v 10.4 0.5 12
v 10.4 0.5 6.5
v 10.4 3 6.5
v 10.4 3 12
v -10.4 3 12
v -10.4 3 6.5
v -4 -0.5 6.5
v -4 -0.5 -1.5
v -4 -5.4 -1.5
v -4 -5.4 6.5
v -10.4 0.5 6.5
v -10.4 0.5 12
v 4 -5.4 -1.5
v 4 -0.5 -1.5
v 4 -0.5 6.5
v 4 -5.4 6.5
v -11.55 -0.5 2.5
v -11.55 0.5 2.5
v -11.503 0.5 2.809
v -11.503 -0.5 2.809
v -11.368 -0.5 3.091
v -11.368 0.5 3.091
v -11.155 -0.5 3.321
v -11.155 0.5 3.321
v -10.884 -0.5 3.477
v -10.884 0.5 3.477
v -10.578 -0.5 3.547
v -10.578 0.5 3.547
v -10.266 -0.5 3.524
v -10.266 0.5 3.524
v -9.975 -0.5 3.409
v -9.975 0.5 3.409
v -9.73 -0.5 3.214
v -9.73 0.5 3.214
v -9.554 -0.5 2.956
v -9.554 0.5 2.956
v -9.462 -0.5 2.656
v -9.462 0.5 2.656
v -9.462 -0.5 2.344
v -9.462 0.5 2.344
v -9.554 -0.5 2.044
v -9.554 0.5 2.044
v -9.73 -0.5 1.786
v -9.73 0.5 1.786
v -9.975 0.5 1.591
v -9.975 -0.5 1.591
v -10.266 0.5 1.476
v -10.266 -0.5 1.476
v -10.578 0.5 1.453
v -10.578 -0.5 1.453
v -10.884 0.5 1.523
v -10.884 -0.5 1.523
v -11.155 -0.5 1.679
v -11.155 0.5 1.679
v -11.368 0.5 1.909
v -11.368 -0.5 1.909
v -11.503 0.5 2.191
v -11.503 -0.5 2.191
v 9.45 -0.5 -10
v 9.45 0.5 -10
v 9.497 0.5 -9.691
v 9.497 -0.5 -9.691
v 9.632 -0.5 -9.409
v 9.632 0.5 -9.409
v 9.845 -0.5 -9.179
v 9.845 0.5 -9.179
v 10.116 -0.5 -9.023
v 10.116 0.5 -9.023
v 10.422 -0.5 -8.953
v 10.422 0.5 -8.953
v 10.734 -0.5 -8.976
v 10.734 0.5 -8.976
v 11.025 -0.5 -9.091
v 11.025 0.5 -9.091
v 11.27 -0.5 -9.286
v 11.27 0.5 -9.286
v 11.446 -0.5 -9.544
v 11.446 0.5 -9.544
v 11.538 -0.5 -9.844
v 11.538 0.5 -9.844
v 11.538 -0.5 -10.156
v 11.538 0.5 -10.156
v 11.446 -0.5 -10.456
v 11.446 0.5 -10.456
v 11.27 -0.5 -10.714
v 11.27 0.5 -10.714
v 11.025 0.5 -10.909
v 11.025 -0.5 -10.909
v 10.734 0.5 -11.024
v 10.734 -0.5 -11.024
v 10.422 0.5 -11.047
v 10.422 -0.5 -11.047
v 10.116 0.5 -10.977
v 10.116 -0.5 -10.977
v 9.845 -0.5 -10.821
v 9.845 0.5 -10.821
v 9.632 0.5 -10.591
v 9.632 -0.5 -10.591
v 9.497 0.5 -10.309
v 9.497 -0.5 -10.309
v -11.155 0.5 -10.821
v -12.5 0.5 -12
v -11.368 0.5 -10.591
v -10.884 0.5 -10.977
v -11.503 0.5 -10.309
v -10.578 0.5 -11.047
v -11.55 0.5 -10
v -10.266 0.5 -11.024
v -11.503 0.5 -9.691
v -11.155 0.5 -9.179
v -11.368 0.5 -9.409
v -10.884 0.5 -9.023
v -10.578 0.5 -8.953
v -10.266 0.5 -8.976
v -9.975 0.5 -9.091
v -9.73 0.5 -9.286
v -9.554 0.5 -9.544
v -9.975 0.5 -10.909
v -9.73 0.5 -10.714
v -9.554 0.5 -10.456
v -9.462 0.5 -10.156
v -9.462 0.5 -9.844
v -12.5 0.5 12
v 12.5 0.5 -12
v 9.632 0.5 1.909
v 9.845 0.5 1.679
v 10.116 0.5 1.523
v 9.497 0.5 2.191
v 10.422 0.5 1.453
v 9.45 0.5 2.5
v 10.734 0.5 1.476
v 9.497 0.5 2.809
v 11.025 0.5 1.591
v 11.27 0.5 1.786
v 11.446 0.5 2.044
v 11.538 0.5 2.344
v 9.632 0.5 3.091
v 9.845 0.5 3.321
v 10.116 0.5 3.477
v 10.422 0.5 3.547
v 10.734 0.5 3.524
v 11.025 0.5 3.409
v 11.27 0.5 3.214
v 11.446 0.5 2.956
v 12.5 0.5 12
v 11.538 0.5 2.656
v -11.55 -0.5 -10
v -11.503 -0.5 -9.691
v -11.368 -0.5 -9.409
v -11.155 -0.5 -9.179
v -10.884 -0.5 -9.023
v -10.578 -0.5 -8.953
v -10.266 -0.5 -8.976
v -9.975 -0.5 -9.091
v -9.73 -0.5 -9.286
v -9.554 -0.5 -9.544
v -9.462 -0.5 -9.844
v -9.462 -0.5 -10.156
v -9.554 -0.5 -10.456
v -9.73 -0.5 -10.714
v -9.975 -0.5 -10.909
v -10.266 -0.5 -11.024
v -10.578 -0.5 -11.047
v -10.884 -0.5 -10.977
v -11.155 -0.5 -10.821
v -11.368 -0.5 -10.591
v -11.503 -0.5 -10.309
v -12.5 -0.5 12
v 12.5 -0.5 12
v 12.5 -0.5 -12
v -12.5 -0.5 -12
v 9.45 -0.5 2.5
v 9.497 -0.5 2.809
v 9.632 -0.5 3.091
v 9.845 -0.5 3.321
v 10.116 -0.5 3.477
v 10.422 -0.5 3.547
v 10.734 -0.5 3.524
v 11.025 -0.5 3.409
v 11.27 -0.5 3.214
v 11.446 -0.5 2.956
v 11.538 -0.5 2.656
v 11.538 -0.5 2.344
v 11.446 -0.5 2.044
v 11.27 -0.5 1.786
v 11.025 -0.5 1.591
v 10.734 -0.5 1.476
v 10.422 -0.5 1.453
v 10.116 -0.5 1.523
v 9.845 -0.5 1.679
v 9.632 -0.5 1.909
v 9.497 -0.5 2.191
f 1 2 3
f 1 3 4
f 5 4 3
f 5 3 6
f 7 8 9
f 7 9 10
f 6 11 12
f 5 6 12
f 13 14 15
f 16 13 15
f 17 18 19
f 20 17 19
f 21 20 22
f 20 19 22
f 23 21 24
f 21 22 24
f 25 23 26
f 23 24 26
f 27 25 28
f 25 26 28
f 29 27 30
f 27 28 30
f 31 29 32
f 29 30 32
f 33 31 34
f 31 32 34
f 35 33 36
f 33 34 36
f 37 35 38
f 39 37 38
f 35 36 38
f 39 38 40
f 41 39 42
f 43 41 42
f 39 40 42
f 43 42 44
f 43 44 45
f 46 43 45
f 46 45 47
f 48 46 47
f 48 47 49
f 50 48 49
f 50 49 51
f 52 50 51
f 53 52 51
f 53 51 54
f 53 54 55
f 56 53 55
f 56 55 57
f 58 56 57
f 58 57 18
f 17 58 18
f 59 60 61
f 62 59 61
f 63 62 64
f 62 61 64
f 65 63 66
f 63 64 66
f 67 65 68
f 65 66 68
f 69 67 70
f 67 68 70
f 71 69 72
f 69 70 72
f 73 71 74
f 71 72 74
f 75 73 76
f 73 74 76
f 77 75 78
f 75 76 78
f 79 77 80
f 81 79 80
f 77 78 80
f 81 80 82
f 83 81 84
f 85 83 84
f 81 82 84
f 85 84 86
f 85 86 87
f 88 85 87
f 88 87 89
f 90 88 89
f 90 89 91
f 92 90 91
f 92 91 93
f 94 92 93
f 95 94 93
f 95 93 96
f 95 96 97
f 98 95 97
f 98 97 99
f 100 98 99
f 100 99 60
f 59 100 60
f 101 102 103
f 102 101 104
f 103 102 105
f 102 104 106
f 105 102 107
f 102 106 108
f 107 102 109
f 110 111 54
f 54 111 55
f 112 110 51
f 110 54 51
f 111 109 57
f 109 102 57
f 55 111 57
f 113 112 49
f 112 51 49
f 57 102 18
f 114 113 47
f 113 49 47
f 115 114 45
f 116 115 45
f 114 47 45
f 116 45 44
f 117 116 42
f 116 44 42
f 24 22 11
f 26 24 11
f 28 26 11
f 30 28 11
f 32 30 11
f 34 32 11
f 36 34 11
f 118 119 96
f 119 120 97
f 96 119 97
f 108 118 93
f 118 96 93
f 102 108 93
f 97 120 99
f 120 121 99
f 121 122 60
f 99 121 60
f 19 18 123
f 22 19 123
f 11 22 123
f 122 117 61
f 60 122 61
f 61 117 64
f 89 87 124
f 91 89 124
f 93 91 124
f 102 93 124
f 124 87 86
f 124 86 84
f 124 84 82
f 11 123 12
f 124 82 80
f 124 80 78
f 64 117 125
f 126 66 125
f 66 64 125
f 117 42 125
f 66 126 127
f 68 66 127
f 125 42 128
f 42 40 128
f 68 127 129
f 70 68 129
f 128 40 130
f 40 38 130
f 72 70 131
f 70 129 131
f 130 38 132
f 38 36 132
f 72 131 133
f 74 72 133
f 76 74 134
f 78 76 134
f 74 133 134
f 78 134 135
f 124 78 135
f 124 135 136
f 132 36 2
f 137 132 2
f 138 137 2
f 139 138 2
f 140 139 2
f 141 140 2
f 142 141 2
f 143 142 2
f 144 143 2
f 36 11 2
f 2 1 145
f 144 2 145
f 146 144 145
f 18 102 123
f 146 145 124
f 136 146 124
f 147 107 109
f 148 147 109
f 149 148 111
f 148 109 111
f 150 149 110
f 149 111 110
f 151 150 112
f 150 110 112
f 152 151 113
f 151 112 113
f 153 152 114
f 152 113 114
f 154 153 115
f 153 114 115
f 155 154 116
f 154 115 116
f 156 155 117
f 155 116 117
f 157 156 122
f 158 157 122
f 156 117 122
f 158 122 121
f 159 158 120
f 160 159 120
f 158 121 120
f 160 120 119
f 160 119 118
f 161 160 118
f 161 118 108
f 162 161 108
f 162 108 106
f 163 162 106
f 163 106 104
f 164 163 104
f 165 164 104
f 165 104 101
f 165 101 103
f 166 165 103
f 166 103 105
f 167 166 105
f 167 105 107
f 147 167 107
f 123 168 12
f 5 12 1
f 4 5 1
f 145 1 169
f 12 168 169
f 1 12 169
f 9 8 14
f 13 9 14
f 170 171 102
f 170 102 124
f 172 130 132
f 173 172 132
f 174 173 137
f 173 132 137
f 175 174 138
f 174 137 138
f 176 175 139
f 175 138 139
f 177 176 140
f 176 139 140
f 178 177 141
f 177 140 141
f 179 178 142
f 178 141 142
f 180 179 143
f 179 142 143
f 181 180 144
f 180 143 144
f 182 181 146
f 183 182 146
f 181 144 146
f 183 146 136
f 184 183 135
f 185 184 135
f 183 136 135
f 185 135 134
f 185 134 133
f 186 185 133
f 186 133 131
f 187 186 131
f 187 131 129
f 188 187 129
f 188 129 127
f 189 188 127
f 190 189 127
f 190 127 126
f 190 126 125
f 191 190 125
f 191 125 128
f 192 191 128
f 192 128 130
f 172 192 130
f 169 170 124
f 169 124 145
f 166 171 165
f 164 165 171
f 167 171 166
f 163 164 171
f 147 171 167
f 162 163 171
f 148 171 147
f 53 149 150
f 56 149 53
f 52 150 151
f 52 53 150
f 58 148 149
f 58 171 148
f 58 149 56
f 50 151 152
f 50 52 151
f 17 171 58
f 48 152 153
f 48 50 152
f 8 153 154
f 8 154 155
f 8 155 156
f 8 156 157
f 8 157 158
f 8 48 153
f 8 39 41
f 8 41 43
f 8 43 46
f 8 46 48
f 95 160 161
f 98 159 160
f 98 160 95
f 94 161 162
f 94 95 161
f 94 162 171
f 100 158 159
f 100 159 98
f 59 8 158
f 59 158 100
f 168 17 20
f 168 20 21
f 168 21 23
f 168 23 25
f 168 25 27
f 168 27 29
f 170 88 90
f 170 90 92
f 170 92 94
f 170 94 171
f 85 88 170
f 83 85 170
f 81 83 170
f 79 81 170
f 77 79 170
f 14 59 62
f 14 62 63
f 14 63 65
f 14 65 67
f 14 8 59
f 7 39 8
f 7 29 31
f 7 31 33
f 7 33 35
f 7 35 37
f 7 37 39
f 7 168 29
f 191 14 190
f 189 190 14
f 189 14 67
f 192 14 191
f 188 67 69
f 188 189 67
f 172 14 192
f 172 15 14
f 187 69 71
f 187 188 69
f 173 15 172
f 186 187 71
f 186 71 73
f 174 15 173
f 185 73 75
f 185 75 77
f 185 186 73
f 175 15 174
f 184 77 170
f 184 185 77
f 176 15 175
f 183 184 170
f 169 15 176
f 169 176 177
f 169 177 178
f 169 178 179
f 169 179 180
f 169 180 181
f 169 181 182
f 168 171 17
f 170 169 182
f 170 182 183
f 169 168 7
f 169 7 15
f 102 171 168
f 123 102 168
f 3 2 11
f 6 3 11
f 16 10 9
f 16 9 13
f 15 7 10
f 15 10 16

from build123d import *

# Parameters (mm, degrees)
F0_W     = 25
F0_H     = 24
F1_DEPTH = 0.5
F3_D     = 2.1
F4_W     = 20.8
F4_H     = 5.5
F5_DEPTH = 2.5
F6_W     = 8
F6_H     = 8
F7_DEPTH = 4.9


with BuildPart() as f1:
    # F0 (on Front) → F1 (new body, symmetric)
    with BuildSketch(Plane.XZ):
        Rectangle(F0_W, F0_H)
    extrude(amount=F1_DEPTH, both=True)

    # F3 (through all)
    with Locations(Plane.XZ.offset(0.5)):
        with Locations((-10.5, 2.5), (-10.5, -10), (10.5, 2.5), (10.5, -10)):
            Hole(F3_D / 2)

    # F4 (on face) → F5 (join)
    with BuildSketch(Plane(origin=(0, 0.5, 0), x_dir=(-1, 0, 0), z_dir=(0, 1, 0))):
        with Locations((0, 9.25)):
            Rectangle(F4_W, F4_H)
    extrude(amount=F5_DEPTH)

    # F6 (on face) → F7 (join)
    with BuildSketch(Plane.XZ.offset(0.5)):
        with Locations((0, 2.5)):
            Rectangle(F6_W, F6_H)
    extrude(amount=F7_DEPTH)


solid = f1.part
